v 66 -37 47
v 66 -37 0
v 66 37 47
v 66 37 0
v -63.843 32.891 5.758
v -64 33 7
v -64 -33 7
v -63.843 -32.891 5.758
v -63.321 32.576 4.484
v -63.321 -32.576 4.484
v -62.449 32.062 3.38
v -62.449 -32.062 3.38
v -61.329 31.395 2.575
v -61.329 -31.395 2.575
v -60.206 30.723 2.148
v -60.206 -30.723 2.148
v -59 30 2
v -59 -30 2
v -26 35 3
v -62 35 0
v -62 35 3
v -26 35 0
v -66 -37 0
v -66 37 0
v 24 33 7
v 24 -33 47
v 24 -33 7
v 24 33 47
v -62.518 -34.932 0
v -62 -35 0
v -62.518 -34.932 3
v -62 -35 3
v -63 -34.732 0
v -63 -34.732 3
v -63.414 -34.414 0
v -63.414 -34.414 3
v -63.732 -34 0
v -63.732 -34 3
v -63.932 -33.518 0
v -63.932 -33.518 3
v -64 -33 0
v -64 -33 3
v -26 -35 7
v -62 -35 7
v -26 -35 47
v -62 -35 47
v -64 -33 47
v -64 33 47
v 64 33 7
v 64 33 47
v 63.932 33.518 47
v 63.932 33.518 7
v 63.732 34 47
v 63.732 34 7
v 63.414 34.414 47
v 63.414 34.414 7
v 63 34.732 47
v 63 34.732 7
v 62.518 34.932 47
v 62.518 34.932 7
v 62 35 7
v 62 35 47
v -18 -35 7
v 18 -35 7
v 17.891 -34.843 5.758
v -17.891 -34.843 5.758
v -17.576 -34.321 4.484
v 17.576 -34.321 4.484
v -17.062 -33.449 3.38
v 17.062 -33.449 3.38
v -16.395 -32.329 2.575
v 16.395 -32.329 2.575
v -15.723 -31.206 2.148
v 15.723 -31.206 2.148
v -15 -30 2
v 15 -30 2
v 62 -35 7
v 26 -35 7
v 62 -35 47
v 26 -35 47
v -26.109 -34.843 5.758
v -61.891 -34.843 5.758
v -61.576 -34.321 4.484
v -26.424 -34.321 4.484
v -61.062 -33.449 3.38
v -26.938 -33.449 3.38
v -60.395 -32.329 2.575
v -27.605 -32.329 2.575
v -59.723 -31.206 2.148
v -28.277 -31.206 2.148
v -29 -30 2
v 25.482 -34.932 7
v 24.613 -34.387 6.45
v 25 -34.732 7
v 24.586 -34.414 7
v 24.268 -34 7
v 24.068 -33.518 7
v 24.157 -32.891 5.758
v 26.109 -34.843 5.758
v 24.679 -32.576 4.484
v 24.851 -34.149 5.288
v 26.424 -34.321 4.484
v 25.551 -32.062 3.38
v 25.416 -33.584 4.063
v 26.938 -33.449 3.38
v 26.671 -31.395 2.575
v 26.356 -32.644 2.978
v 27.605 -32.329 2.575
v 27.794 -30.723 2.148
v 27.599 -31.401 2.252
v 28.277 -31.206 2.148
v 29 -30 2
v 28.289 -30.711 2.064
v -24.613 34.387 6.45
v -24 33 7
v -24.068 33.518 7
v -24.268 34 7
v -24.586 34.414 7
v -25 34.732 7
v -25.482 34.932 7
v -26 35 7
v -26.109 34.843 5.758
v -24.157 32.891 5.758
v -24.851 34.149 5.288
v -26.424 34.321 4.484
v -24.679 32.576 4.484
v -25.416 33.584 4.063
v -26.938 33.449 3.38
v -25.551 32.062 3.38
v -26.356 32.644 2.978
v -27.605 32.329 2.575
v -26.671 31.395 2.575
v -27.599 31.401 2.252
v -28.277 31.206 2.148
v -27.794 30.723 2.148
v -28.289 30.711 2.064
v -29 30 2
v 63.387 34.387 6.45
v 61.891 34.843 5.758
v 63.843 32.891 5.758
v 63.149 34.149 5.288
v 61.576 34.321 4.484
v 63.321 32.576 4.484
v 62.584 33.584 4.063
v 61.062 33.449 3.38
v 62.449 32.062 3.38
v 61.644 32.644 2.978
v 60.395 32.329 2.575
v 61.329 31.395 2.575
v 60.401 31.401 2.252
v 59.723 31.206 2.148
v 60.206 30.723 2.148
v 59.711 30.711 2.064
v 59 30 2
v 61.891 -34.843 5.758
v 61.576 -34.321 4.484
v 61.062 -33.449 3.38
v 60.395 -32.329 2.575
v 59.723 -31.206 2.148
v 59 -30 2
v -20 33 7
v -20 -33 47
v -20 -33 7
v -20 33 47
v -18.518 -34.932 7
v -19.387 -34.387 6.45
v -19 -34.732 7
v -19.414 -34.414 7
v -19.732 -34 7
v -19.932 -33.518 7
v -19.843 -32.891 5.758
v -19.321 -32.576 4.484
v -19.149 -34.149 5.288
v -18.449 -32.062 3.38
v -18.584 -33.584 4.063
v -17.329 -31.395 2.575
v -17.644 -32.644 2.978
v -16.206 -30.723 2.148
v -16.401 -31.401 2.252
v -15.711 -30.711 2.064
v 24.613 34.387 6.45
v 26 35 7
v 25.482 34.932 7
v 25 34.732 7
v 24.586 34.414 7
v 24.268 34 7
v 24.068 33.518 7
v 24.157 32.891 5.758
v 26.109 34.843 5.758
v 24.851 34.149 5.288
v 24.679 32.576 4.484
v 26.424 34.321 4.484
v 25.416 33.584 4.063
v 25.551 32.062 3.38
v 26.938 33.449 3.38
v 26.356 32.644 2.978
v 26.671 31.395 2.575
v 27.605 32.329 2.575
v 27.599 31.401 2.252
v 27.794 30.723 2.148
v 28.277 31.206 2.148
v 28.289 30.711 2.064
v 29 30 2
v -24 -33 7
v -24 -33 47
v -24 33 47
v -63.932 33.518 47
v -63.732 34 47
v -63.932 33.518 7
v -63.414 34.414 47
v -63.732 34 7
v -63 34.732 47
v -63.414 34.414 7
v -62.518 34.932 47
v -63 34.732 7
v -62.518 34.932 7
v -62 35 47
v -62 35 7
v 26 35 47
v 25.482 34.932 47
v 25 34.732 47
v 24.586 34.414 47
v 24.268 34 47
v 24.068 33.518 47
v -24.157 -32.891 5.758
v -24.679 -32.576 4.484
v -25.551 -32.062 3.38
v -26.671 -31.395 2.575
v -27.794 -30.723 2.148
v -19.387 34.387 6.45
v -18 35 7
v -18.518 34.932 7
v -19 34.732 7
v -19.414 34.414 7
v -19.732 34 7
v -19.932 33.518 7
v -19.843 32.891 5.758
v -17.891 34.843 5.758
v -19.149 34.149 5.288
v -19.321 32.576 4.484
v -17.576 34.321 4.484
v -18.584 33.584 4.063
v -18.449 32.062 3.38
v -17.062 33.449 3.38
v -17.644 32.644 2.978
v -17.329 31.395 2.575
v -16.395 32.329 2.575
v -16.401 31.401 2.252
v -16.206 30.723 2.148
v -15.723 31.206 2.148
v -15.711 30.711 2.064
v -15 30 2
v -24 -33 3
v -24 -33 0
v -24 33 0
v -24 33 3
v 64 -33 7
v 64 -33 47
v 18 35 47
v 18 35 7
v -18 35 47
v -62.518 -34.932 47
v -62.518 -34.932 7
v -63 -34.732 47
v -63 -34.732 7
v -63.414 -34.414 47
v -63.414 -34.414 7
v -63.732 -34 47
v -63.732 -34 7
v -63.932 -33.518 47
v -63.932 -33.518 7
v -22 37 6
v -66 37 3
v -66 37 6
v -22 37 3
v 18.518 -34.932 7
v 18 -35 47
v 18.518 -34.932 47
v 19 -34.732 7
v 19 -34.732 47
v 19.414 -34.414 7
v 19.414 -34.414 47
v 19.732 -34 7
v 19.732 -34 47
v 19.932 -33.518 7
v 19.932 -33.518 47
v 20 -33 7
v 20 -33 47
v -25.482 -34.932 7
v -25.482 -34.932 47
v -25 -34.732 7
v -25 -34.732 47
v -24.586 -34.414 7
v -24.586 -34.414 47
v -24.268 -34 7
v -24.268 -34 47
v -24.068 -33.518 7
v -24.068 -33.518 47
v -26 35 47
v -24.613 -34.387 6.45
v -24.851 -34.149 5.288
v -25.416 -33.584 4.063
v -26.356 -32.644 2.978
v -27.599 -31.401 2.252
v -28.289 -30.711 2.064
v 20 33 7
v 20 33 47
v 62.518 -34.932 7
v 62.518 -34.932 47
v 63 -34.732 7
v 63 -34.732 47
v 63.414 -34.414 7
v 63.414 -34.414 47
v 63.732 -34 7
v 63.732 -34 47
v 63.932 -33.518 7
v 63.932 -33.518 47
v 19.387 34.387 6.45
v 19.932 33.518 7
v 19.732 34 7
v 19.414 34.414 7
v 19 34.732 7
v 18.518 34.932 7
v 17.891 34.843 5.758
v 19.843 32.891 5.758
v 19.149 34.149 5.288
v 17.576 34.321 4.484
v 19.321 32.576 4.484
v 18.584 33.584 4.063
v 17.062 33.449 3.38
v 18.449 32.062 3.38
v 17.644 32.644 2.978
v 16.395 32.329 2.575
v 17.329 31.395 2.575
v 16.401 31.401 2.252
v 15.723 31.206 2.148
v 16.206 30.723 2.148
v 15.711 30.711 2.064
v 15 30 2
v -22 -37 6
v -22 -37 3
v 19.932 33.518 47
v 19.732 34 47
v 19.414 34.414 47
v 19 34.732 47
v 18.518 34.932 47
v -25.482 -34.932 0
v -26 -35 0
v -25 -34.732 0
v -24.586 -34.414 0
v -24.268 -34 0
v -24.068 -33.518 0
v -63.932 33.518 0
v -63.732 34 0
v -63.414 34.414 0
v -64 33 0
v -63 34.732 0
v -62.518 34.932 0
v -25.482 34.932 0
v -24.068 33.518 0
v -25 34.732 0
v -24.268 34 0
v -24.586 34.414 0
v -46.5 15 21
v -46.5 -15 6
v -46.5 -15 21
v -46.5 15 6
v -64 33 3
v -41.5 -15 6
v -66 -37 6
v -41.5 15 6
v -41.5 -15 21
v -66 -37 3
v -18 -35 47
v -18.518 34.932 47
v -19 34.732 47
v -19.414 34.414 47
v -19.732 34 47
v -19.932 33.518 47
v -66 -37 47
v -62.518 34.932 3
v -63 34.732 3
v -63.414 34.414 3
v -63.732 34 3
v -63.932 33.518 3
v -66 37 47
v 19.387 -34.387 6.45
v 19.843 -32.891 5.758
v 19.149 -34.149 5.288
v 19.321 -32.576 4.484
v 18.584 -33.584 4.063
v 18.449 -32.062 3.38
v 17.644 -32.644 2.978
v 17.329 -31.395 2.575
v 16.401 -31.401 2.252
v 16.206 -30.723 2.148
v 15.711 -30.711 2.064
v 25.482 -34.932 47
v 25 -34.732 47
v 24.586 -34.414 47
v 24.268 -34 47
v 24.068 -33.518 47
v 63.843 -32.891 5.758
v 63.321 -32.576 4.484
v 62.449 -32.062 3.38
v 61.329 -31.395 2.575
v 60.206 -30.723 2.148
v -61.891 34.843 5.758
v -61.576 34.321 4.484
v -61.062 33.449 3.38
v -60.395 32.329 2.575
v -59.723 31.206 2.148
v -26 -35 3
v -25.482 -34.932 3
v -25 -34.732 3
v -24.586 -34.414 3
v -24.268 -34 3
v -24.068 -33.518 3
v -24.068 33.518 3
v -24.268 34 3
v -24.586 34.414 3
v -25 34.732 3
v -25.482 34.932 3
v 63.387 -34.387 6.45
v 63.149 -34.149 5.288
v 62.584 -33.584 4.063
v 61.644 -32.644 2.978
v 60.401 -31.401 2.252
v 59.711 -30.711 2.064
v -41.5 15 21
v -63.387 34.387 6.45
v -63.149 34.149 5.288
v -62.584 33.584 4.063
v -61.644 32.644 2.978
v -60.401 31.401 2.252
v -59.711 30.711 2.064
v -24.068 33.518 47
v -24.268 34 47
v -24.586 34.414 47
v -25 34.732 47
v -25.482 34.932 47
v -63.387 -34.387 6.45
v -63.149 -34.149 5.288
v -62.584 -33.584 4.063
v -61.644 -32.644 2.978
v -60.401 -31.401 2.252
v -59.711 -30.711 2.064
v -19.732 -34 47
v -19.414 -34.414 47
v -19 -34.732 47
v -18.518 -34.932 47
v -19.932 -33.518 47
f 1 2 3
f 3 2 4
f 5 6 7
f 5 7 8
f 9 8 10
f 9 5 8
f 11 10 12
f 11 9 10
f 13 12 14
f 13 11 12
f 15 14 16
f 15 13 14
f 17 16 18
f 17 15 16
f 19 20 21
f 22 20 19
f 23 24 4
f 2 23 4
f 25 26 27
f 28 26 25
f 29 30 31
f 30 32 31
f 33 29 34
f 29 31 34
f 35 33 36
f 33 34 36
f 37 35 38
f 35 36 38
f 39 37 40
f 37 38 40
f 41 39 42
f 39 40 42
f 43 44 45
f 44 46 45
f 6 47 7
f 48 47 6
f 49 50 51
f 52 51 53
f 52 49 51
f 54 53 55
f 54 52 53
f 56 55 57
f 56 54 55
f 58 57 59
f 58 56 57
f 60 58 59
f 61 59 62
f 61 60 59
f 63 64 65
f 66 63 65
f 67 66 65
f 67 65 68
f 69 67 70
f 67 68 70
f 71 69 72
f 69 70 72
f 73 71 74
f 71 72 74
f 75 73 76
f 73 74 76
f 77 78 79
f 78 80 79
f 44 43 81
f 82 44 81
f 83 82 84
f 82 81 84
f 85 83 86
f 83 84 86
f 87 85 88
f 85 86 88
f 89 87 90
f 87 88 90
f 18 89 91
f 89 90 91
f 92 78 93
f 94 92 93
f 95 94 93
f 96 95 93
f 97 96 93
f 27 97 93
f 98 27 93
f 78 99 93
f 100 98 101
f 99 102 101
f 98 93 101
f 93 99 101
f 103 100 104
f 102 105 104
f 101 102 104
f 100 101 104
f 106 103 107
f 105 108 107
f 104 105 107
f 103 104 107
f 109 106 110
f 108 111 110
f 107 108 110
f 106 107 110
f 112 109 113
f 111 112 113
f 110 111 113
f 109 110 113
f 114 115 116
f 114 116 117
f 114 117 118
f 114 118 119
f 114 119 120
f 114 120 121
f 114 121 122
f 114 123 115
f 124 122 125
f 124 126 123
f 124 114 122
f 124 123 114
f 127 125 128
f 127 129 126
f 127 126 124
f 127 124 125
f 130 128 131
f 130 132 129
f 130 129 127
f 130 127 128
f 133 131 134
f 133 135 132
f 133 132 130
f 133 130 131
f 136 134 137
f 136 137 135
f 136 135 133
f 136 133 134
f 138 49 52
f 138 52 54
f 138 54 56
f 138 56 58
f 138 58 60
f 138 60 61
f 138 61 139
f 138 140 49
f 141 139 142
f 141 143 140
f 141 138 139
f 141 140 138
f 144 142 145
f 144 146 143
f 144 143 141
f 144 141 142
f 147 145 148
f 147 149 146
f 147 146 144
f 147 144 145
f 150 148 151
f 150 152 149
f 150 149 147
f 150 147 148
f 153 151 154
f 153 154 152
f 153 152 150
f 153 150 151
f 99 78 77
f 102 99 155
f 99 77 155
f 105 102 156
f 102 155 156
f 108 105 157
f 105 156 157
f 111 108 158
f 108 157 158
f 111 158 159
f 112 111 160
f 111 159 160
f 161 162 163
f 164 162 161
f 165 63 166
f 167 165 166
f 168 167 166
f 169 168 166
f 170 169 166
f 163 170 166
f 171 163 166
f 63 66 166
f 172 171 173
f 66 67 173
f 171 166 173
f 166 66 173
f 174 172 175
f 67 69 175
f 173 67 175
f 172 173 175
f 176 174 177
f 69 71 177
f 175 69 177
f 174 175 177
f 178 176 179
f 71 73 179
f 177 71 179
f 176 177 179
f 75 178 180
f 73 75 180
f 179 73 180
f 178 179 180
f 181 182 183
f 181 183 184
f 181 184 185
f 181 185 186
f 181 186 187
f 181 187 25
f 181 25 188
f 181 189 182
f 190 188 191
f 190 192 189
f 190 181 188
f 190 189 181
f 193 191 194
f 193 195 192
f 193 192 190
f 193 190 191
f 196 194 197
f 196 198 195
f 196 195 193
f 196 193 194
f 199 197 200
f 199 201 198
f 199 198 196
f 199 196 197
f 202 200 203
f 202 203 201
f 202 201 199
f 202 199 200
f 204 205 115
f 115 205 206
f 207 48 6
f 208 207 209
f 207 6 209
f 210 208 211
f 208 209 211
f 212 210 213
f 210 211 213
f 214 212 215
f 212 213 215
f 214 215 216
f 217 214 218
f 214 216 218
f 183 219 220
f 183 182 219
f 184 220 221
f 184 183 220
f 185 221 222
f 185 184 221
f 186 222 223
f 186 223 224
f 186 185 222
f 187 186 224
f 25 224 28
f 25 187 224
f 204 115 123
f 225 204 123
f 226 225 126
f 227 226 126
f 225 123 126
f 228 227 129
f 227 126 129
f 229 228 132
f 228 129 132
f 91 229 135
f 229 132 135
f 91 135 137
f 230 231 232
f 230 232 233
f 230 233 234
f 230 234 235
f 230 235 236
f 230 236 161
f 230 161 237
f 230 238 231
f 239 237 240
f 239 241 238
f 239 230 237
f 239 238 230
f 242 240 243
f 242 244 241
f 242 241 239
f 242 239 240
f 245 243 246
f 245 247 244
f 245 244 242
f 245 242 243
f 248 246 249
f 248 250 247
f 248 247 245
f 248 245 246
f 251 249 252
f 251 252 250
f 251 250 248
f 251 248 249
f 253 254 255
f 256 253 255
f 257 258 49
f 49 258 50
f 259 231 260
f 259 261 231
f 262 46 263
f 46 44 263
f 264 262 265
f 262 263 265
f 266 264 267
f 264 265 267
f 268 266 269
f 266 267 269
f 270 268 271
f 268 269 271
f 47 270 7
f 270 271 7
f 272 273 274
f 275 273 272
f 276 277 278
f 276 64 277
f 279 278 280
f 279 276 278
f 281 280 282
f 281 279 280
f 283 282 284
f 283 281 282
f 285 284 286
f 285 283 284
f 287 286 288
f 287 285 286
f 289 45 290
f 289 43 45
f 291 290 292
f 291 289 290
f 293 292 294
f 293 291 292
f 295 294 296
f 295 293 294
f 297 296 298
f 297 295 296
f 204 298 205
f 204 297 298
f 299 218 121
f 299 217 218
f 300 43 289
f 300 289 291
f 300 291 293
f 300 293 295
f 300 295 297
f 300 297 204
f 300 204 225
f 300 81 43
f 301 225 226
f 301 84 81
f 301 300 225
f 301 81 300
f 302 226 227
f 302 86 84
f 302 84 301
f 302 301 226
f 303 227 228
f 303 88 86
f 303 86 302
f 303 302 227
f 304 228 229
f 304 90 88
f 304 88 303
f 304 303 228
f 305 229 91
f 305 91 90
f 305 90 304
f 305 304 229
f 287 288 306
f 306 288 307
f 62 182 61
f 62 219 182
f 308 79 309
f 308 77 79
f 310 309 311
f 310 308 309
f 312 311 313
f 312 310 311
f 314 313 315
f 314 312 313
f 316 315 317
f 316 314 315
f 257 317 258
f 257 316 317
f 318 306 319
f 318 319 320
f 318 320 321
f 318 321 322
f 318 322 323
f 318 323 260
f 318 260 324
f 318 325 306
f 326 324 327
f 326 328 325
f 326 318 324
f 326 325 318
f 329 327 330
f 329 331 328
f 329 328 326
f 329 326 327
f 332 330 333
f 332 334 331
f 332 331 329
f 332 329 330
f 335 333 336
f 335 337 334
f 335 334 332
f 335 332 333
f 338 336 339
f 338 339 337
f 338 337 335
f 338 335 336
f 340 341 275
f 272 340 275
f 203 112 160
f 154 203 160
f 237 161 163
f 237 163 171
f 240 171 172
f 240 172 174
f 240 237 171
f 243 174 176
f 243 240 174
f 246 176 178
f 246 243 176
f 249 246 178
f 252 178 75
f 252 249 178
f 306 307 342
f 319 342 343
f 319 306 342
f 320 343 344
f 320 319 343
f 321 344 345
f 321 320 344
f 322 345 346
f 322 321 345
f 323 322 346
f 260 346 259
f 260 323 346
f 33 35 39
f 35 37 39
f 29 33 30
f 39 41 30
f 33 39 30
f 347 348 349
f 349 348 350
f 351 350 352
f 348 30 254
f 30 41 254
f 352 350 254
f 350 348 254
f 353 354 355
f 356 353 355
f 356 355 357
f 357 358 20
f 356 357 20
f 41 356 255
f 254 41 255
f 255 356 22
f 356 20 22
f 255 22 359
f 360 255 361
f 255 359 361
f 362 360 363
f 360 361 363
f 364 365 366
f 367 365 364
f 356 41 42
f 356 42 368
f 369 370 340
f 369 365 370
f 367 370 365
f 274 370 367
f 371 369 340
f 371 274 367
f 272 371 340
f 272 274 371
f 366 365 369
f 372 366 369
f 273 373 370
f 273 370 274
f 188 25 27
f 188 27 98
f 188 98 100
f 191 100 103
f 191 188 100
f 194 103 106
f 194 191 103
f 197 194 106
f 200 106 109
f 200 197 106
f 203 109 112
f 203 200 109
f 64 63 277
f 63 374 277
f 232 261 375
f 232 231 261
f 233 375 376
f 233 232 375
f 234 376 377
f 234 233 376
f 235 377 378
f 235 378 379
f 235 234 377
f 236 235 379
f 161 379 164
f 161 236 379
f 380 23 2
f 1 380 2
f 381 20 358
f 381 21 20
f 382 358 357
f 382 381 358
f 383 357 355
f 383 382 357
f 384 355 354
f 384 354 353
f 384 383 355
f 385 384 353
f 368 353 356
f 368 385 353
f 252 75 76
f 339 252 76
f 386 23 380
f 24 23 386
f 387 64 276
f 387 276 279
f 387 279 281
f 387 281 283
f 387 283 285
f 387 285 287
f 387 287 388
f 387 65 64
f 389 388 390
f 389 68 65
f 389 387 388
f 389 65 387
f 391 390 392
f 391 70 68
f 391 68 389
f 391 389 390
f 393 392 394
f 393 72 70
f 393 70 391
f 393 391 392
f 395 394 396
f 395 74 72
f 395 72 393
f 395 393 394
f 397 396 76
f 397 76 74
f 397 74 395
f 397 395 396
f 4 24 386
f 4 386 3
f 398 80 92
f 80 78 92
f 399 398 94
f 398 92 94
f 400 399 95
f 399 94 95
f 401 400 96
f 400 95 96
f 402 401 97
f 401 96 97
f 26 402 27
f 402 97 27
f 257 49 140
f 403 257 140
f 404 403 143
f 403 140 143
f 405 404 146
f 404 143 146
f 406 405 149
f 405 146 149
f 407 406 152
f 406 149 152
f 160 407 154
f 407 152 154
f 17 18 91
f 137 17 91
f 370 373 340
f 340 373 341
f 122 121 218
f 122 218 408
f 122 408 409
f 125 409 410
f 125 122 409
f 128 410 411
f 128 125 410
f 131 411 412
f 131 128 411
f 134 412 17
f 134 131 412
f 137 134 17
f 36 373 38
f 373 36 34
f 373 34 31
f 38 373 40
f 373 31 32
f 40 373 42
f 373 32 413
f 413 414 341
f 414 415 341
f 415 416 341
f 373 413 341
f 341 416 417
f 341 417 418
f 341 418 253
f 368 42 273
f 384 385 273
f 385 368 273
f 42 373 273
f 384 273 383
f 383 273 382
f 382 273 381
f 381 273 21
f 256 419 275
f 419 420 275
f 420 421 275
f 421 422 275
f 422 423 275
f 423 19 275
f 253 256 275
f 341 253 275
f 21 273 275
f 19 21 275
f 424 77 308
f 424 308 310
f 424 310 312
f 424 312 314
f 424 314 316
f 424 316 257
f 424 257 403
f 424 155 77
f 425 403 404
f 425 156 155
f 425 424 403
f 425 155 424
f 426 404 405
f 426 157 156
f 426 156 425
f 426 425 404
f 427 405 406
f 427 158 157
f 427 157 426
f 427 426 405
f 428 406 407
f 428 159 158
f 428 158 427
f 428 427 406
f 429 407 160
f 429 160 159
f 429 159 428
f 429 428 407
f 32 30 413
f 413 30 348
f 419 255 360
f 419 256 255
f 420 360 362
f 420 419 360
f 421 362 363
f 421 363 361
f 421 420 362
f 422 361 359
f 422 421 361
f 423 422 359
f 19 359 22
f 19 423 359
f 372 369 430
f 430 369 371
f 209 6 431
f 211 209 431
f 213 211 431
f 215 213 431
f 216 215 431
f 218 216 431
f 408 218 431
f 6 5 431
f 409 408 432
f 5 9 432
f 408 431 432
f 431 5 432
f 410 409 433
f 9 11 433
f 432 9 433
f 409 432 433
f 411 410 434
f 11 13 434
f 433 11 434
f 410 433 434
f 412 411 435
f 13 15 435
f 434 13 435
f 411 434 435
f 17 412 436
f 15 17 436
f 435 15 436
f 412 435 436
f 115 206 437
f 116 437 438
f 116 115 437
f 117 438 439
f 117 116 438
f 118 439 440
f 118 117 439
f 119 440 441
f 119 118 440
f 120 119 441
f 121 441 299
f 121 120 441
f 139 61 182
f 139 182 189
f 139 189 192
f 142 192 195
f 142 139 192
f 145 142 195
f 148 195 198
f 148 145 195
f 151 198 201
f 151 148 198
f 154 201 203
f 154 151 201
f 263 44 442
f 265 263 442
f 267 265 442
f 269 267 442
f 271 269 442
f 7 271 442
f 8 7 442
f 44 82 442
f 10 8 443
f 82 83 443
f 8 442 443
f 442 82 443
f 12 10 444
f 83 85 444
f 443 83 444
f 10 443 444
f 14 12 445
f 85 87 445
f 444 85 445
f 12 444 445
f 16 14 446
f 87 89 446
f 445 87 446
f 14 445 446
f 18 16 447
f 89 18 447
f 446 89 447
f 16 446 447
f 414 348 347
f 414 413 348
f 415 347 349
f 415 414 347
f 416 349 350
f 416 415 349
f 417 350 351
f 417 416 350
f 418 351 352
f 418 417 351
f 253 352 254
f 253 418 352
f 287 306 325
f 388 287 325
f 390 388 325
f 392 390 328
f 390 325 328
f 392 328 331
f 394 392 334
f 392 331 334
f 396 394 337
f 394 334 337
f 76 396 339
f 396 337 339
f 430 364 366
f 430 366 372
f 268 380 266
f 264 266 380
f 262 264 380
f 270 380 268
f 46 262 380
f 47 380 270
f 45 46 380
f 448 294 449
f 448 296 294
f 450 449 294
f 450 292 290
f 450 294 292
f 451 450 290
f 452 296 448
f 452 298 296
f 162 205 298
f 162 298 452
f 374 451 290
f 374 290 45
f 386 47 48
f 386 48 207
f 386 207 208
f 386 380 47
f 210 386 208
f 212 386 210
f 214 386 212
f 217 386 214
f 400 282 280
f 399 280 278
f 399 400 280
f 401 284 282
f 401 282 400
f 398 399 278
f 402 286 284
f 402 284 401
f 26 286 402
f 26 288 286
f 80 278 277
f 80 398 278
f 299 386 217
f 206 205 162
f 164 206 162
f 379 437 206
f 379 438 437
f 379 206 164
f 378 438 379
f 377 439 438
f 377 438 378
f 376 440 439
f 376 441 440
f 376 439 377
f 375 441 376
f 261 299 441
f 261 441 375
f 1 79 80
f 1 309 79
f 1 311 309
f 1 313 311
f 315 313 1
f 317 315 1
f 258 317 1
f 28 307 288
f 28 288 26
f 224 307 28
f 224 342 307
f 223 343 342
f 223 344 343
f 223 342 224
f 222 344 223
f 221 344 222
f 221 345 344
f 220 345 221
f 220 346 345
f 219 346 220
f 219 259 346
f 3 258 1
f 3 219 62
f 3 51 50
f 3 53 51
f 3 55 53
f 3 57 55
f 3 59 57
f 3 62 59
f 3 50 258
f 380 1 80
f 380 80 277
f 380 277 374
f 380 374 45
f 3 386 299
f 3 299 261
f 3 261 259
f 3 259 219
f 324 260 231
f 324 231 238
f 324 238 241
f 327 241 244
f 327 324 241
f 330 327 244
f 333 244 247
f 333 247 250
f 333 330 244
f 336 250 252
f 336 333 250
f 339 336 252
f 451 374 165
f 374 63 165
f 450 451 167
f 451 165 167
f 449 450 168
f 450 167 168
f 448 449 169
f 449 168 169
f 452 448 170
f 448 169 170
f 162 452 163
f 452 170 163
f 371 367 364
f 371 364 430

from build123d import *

# Parameters (mm, degrees)
SKETCH_W            = 132
SKETCH_H            = 74
PAD_DEPTH           = 47
SKETCH001_W         = 40
SKETCH001_H         = 70
POCKET_DEPTH        = 45
LINEARPATTERN_COUNT = 3
LINEARPATTERN_PITCH = 44
FILLET_R            = 5
FILLET003_R         = 2
SKETCH002_W         = 40
SKETCH002_H         = 70
PAD001_DEPTH        = 3
SKETCH003_W         = 44
SKETCH003_H         = 74
PAD002_DEPTH        = 3
SKETCH004_W         = 5
SKETCH004_H         = 30
PAD003_DEPTH        = 15
FILLET004_R         = 2


with BuildPart() as containerbody:
    # Sketch → Pad (new body)
    with BuildSketch(Plane.XY):
        Rectangle(SKETCH_W, SKETCH_H)
    extrude(amount=PAD_DEPTH)

    # Sketch001 → Pocket (cut)
    with BuildSketch(Plane.XY.offset(47)):
        with Locations((-44, 0)):
            Rectangle(SKETCH001_W, SKETCH001_H)
    pocket = extrude(amount=-POCKET_DEPTH, mode=Mode.SUBTRACT)

    # LinearPattern: Pocket ×3
    with Locations(*[(i * LINEARPATTERN_PITCH, 0, 0) for i in range(1, LINEARPATTERN_COUNT)]):
        add(pocket, mode=Mode.SUBTRACT)

    # Fillet
    fillet_edges = [containerbody.edges().sort_by_distance(p)[0] for p in [
        (-64, 0, 2),
        (-44, -35, 2),
        (-24, 0, 2),
        (-44, 35, 2),
        (-20, 0, 2),
        (0, -35, 2),
        (20, 0, 2),
        (0, 35, 2),
        (24, 0, 2),
        (44, -35, 2),
        (64, 0, 2),
        (44, 35, 2),
    ]]
    fillet(fillet_edges, radius=FILLET_R)

    # Fillet003
    fillet003_edges = [containerbody.edges().sort_by_distance(p)[0] for p in [
        (-64, 35, 27),
        (-20, 35, 27),
        (24, 35, 27),
        (-24, 35, 27),
        (20, 35, 27),
        (64, 35, 27),
        (64, -35, 27),
        (20, -35, 27),
        (-24, -35, 27),
        (24, -35, 27),
        (-20, -35, 27),
        (-64, -35, 27),
    ]]
    fillet(fillet003_edges, radius=FILLET003_R)


with BuildPart() as plugbody:
    # Sketch002 → Pad001 (new body)
    with BuildSketch(Plane.XY):
        with Locations((-44, 0)):
            Rectangle(SKETCH002_W, SKETCH002_H)
    extrude(amount=PAD001_DEPTH)

    # Sketch003 → Pad002 (join)
    with BuildSketch(Plane.XY.offset(3)):
        with Locations((-44, 0)):
            Rectangle(SKETCH003_W, SKETCH003_H)
    extrude(amount=PAD002_DEPTH)

    # Sketch004 → Pad003 (join)
    with BuildSketch(Plane.XY.offset(6)):
        with Locations((-44, 0)):
            Rectangle(SKETCH004_W, SKETCH004_H)
    extrude(amount=PAD003_DEPTH)

    # Fillet004
    fillet004_edges = [plugbody.edges().sort_by_distance(p)[0] for p in [
        (-64, 35, 1.5),
        (-24, 35, 1.5),
        (-64, -35, 1.5),
        (-24, -35, 1.5),
    ]]
    fillet(fillet004_edges, radius=FILLET004_R)


solid = Compound([containerbody.part, plugbody.part])
